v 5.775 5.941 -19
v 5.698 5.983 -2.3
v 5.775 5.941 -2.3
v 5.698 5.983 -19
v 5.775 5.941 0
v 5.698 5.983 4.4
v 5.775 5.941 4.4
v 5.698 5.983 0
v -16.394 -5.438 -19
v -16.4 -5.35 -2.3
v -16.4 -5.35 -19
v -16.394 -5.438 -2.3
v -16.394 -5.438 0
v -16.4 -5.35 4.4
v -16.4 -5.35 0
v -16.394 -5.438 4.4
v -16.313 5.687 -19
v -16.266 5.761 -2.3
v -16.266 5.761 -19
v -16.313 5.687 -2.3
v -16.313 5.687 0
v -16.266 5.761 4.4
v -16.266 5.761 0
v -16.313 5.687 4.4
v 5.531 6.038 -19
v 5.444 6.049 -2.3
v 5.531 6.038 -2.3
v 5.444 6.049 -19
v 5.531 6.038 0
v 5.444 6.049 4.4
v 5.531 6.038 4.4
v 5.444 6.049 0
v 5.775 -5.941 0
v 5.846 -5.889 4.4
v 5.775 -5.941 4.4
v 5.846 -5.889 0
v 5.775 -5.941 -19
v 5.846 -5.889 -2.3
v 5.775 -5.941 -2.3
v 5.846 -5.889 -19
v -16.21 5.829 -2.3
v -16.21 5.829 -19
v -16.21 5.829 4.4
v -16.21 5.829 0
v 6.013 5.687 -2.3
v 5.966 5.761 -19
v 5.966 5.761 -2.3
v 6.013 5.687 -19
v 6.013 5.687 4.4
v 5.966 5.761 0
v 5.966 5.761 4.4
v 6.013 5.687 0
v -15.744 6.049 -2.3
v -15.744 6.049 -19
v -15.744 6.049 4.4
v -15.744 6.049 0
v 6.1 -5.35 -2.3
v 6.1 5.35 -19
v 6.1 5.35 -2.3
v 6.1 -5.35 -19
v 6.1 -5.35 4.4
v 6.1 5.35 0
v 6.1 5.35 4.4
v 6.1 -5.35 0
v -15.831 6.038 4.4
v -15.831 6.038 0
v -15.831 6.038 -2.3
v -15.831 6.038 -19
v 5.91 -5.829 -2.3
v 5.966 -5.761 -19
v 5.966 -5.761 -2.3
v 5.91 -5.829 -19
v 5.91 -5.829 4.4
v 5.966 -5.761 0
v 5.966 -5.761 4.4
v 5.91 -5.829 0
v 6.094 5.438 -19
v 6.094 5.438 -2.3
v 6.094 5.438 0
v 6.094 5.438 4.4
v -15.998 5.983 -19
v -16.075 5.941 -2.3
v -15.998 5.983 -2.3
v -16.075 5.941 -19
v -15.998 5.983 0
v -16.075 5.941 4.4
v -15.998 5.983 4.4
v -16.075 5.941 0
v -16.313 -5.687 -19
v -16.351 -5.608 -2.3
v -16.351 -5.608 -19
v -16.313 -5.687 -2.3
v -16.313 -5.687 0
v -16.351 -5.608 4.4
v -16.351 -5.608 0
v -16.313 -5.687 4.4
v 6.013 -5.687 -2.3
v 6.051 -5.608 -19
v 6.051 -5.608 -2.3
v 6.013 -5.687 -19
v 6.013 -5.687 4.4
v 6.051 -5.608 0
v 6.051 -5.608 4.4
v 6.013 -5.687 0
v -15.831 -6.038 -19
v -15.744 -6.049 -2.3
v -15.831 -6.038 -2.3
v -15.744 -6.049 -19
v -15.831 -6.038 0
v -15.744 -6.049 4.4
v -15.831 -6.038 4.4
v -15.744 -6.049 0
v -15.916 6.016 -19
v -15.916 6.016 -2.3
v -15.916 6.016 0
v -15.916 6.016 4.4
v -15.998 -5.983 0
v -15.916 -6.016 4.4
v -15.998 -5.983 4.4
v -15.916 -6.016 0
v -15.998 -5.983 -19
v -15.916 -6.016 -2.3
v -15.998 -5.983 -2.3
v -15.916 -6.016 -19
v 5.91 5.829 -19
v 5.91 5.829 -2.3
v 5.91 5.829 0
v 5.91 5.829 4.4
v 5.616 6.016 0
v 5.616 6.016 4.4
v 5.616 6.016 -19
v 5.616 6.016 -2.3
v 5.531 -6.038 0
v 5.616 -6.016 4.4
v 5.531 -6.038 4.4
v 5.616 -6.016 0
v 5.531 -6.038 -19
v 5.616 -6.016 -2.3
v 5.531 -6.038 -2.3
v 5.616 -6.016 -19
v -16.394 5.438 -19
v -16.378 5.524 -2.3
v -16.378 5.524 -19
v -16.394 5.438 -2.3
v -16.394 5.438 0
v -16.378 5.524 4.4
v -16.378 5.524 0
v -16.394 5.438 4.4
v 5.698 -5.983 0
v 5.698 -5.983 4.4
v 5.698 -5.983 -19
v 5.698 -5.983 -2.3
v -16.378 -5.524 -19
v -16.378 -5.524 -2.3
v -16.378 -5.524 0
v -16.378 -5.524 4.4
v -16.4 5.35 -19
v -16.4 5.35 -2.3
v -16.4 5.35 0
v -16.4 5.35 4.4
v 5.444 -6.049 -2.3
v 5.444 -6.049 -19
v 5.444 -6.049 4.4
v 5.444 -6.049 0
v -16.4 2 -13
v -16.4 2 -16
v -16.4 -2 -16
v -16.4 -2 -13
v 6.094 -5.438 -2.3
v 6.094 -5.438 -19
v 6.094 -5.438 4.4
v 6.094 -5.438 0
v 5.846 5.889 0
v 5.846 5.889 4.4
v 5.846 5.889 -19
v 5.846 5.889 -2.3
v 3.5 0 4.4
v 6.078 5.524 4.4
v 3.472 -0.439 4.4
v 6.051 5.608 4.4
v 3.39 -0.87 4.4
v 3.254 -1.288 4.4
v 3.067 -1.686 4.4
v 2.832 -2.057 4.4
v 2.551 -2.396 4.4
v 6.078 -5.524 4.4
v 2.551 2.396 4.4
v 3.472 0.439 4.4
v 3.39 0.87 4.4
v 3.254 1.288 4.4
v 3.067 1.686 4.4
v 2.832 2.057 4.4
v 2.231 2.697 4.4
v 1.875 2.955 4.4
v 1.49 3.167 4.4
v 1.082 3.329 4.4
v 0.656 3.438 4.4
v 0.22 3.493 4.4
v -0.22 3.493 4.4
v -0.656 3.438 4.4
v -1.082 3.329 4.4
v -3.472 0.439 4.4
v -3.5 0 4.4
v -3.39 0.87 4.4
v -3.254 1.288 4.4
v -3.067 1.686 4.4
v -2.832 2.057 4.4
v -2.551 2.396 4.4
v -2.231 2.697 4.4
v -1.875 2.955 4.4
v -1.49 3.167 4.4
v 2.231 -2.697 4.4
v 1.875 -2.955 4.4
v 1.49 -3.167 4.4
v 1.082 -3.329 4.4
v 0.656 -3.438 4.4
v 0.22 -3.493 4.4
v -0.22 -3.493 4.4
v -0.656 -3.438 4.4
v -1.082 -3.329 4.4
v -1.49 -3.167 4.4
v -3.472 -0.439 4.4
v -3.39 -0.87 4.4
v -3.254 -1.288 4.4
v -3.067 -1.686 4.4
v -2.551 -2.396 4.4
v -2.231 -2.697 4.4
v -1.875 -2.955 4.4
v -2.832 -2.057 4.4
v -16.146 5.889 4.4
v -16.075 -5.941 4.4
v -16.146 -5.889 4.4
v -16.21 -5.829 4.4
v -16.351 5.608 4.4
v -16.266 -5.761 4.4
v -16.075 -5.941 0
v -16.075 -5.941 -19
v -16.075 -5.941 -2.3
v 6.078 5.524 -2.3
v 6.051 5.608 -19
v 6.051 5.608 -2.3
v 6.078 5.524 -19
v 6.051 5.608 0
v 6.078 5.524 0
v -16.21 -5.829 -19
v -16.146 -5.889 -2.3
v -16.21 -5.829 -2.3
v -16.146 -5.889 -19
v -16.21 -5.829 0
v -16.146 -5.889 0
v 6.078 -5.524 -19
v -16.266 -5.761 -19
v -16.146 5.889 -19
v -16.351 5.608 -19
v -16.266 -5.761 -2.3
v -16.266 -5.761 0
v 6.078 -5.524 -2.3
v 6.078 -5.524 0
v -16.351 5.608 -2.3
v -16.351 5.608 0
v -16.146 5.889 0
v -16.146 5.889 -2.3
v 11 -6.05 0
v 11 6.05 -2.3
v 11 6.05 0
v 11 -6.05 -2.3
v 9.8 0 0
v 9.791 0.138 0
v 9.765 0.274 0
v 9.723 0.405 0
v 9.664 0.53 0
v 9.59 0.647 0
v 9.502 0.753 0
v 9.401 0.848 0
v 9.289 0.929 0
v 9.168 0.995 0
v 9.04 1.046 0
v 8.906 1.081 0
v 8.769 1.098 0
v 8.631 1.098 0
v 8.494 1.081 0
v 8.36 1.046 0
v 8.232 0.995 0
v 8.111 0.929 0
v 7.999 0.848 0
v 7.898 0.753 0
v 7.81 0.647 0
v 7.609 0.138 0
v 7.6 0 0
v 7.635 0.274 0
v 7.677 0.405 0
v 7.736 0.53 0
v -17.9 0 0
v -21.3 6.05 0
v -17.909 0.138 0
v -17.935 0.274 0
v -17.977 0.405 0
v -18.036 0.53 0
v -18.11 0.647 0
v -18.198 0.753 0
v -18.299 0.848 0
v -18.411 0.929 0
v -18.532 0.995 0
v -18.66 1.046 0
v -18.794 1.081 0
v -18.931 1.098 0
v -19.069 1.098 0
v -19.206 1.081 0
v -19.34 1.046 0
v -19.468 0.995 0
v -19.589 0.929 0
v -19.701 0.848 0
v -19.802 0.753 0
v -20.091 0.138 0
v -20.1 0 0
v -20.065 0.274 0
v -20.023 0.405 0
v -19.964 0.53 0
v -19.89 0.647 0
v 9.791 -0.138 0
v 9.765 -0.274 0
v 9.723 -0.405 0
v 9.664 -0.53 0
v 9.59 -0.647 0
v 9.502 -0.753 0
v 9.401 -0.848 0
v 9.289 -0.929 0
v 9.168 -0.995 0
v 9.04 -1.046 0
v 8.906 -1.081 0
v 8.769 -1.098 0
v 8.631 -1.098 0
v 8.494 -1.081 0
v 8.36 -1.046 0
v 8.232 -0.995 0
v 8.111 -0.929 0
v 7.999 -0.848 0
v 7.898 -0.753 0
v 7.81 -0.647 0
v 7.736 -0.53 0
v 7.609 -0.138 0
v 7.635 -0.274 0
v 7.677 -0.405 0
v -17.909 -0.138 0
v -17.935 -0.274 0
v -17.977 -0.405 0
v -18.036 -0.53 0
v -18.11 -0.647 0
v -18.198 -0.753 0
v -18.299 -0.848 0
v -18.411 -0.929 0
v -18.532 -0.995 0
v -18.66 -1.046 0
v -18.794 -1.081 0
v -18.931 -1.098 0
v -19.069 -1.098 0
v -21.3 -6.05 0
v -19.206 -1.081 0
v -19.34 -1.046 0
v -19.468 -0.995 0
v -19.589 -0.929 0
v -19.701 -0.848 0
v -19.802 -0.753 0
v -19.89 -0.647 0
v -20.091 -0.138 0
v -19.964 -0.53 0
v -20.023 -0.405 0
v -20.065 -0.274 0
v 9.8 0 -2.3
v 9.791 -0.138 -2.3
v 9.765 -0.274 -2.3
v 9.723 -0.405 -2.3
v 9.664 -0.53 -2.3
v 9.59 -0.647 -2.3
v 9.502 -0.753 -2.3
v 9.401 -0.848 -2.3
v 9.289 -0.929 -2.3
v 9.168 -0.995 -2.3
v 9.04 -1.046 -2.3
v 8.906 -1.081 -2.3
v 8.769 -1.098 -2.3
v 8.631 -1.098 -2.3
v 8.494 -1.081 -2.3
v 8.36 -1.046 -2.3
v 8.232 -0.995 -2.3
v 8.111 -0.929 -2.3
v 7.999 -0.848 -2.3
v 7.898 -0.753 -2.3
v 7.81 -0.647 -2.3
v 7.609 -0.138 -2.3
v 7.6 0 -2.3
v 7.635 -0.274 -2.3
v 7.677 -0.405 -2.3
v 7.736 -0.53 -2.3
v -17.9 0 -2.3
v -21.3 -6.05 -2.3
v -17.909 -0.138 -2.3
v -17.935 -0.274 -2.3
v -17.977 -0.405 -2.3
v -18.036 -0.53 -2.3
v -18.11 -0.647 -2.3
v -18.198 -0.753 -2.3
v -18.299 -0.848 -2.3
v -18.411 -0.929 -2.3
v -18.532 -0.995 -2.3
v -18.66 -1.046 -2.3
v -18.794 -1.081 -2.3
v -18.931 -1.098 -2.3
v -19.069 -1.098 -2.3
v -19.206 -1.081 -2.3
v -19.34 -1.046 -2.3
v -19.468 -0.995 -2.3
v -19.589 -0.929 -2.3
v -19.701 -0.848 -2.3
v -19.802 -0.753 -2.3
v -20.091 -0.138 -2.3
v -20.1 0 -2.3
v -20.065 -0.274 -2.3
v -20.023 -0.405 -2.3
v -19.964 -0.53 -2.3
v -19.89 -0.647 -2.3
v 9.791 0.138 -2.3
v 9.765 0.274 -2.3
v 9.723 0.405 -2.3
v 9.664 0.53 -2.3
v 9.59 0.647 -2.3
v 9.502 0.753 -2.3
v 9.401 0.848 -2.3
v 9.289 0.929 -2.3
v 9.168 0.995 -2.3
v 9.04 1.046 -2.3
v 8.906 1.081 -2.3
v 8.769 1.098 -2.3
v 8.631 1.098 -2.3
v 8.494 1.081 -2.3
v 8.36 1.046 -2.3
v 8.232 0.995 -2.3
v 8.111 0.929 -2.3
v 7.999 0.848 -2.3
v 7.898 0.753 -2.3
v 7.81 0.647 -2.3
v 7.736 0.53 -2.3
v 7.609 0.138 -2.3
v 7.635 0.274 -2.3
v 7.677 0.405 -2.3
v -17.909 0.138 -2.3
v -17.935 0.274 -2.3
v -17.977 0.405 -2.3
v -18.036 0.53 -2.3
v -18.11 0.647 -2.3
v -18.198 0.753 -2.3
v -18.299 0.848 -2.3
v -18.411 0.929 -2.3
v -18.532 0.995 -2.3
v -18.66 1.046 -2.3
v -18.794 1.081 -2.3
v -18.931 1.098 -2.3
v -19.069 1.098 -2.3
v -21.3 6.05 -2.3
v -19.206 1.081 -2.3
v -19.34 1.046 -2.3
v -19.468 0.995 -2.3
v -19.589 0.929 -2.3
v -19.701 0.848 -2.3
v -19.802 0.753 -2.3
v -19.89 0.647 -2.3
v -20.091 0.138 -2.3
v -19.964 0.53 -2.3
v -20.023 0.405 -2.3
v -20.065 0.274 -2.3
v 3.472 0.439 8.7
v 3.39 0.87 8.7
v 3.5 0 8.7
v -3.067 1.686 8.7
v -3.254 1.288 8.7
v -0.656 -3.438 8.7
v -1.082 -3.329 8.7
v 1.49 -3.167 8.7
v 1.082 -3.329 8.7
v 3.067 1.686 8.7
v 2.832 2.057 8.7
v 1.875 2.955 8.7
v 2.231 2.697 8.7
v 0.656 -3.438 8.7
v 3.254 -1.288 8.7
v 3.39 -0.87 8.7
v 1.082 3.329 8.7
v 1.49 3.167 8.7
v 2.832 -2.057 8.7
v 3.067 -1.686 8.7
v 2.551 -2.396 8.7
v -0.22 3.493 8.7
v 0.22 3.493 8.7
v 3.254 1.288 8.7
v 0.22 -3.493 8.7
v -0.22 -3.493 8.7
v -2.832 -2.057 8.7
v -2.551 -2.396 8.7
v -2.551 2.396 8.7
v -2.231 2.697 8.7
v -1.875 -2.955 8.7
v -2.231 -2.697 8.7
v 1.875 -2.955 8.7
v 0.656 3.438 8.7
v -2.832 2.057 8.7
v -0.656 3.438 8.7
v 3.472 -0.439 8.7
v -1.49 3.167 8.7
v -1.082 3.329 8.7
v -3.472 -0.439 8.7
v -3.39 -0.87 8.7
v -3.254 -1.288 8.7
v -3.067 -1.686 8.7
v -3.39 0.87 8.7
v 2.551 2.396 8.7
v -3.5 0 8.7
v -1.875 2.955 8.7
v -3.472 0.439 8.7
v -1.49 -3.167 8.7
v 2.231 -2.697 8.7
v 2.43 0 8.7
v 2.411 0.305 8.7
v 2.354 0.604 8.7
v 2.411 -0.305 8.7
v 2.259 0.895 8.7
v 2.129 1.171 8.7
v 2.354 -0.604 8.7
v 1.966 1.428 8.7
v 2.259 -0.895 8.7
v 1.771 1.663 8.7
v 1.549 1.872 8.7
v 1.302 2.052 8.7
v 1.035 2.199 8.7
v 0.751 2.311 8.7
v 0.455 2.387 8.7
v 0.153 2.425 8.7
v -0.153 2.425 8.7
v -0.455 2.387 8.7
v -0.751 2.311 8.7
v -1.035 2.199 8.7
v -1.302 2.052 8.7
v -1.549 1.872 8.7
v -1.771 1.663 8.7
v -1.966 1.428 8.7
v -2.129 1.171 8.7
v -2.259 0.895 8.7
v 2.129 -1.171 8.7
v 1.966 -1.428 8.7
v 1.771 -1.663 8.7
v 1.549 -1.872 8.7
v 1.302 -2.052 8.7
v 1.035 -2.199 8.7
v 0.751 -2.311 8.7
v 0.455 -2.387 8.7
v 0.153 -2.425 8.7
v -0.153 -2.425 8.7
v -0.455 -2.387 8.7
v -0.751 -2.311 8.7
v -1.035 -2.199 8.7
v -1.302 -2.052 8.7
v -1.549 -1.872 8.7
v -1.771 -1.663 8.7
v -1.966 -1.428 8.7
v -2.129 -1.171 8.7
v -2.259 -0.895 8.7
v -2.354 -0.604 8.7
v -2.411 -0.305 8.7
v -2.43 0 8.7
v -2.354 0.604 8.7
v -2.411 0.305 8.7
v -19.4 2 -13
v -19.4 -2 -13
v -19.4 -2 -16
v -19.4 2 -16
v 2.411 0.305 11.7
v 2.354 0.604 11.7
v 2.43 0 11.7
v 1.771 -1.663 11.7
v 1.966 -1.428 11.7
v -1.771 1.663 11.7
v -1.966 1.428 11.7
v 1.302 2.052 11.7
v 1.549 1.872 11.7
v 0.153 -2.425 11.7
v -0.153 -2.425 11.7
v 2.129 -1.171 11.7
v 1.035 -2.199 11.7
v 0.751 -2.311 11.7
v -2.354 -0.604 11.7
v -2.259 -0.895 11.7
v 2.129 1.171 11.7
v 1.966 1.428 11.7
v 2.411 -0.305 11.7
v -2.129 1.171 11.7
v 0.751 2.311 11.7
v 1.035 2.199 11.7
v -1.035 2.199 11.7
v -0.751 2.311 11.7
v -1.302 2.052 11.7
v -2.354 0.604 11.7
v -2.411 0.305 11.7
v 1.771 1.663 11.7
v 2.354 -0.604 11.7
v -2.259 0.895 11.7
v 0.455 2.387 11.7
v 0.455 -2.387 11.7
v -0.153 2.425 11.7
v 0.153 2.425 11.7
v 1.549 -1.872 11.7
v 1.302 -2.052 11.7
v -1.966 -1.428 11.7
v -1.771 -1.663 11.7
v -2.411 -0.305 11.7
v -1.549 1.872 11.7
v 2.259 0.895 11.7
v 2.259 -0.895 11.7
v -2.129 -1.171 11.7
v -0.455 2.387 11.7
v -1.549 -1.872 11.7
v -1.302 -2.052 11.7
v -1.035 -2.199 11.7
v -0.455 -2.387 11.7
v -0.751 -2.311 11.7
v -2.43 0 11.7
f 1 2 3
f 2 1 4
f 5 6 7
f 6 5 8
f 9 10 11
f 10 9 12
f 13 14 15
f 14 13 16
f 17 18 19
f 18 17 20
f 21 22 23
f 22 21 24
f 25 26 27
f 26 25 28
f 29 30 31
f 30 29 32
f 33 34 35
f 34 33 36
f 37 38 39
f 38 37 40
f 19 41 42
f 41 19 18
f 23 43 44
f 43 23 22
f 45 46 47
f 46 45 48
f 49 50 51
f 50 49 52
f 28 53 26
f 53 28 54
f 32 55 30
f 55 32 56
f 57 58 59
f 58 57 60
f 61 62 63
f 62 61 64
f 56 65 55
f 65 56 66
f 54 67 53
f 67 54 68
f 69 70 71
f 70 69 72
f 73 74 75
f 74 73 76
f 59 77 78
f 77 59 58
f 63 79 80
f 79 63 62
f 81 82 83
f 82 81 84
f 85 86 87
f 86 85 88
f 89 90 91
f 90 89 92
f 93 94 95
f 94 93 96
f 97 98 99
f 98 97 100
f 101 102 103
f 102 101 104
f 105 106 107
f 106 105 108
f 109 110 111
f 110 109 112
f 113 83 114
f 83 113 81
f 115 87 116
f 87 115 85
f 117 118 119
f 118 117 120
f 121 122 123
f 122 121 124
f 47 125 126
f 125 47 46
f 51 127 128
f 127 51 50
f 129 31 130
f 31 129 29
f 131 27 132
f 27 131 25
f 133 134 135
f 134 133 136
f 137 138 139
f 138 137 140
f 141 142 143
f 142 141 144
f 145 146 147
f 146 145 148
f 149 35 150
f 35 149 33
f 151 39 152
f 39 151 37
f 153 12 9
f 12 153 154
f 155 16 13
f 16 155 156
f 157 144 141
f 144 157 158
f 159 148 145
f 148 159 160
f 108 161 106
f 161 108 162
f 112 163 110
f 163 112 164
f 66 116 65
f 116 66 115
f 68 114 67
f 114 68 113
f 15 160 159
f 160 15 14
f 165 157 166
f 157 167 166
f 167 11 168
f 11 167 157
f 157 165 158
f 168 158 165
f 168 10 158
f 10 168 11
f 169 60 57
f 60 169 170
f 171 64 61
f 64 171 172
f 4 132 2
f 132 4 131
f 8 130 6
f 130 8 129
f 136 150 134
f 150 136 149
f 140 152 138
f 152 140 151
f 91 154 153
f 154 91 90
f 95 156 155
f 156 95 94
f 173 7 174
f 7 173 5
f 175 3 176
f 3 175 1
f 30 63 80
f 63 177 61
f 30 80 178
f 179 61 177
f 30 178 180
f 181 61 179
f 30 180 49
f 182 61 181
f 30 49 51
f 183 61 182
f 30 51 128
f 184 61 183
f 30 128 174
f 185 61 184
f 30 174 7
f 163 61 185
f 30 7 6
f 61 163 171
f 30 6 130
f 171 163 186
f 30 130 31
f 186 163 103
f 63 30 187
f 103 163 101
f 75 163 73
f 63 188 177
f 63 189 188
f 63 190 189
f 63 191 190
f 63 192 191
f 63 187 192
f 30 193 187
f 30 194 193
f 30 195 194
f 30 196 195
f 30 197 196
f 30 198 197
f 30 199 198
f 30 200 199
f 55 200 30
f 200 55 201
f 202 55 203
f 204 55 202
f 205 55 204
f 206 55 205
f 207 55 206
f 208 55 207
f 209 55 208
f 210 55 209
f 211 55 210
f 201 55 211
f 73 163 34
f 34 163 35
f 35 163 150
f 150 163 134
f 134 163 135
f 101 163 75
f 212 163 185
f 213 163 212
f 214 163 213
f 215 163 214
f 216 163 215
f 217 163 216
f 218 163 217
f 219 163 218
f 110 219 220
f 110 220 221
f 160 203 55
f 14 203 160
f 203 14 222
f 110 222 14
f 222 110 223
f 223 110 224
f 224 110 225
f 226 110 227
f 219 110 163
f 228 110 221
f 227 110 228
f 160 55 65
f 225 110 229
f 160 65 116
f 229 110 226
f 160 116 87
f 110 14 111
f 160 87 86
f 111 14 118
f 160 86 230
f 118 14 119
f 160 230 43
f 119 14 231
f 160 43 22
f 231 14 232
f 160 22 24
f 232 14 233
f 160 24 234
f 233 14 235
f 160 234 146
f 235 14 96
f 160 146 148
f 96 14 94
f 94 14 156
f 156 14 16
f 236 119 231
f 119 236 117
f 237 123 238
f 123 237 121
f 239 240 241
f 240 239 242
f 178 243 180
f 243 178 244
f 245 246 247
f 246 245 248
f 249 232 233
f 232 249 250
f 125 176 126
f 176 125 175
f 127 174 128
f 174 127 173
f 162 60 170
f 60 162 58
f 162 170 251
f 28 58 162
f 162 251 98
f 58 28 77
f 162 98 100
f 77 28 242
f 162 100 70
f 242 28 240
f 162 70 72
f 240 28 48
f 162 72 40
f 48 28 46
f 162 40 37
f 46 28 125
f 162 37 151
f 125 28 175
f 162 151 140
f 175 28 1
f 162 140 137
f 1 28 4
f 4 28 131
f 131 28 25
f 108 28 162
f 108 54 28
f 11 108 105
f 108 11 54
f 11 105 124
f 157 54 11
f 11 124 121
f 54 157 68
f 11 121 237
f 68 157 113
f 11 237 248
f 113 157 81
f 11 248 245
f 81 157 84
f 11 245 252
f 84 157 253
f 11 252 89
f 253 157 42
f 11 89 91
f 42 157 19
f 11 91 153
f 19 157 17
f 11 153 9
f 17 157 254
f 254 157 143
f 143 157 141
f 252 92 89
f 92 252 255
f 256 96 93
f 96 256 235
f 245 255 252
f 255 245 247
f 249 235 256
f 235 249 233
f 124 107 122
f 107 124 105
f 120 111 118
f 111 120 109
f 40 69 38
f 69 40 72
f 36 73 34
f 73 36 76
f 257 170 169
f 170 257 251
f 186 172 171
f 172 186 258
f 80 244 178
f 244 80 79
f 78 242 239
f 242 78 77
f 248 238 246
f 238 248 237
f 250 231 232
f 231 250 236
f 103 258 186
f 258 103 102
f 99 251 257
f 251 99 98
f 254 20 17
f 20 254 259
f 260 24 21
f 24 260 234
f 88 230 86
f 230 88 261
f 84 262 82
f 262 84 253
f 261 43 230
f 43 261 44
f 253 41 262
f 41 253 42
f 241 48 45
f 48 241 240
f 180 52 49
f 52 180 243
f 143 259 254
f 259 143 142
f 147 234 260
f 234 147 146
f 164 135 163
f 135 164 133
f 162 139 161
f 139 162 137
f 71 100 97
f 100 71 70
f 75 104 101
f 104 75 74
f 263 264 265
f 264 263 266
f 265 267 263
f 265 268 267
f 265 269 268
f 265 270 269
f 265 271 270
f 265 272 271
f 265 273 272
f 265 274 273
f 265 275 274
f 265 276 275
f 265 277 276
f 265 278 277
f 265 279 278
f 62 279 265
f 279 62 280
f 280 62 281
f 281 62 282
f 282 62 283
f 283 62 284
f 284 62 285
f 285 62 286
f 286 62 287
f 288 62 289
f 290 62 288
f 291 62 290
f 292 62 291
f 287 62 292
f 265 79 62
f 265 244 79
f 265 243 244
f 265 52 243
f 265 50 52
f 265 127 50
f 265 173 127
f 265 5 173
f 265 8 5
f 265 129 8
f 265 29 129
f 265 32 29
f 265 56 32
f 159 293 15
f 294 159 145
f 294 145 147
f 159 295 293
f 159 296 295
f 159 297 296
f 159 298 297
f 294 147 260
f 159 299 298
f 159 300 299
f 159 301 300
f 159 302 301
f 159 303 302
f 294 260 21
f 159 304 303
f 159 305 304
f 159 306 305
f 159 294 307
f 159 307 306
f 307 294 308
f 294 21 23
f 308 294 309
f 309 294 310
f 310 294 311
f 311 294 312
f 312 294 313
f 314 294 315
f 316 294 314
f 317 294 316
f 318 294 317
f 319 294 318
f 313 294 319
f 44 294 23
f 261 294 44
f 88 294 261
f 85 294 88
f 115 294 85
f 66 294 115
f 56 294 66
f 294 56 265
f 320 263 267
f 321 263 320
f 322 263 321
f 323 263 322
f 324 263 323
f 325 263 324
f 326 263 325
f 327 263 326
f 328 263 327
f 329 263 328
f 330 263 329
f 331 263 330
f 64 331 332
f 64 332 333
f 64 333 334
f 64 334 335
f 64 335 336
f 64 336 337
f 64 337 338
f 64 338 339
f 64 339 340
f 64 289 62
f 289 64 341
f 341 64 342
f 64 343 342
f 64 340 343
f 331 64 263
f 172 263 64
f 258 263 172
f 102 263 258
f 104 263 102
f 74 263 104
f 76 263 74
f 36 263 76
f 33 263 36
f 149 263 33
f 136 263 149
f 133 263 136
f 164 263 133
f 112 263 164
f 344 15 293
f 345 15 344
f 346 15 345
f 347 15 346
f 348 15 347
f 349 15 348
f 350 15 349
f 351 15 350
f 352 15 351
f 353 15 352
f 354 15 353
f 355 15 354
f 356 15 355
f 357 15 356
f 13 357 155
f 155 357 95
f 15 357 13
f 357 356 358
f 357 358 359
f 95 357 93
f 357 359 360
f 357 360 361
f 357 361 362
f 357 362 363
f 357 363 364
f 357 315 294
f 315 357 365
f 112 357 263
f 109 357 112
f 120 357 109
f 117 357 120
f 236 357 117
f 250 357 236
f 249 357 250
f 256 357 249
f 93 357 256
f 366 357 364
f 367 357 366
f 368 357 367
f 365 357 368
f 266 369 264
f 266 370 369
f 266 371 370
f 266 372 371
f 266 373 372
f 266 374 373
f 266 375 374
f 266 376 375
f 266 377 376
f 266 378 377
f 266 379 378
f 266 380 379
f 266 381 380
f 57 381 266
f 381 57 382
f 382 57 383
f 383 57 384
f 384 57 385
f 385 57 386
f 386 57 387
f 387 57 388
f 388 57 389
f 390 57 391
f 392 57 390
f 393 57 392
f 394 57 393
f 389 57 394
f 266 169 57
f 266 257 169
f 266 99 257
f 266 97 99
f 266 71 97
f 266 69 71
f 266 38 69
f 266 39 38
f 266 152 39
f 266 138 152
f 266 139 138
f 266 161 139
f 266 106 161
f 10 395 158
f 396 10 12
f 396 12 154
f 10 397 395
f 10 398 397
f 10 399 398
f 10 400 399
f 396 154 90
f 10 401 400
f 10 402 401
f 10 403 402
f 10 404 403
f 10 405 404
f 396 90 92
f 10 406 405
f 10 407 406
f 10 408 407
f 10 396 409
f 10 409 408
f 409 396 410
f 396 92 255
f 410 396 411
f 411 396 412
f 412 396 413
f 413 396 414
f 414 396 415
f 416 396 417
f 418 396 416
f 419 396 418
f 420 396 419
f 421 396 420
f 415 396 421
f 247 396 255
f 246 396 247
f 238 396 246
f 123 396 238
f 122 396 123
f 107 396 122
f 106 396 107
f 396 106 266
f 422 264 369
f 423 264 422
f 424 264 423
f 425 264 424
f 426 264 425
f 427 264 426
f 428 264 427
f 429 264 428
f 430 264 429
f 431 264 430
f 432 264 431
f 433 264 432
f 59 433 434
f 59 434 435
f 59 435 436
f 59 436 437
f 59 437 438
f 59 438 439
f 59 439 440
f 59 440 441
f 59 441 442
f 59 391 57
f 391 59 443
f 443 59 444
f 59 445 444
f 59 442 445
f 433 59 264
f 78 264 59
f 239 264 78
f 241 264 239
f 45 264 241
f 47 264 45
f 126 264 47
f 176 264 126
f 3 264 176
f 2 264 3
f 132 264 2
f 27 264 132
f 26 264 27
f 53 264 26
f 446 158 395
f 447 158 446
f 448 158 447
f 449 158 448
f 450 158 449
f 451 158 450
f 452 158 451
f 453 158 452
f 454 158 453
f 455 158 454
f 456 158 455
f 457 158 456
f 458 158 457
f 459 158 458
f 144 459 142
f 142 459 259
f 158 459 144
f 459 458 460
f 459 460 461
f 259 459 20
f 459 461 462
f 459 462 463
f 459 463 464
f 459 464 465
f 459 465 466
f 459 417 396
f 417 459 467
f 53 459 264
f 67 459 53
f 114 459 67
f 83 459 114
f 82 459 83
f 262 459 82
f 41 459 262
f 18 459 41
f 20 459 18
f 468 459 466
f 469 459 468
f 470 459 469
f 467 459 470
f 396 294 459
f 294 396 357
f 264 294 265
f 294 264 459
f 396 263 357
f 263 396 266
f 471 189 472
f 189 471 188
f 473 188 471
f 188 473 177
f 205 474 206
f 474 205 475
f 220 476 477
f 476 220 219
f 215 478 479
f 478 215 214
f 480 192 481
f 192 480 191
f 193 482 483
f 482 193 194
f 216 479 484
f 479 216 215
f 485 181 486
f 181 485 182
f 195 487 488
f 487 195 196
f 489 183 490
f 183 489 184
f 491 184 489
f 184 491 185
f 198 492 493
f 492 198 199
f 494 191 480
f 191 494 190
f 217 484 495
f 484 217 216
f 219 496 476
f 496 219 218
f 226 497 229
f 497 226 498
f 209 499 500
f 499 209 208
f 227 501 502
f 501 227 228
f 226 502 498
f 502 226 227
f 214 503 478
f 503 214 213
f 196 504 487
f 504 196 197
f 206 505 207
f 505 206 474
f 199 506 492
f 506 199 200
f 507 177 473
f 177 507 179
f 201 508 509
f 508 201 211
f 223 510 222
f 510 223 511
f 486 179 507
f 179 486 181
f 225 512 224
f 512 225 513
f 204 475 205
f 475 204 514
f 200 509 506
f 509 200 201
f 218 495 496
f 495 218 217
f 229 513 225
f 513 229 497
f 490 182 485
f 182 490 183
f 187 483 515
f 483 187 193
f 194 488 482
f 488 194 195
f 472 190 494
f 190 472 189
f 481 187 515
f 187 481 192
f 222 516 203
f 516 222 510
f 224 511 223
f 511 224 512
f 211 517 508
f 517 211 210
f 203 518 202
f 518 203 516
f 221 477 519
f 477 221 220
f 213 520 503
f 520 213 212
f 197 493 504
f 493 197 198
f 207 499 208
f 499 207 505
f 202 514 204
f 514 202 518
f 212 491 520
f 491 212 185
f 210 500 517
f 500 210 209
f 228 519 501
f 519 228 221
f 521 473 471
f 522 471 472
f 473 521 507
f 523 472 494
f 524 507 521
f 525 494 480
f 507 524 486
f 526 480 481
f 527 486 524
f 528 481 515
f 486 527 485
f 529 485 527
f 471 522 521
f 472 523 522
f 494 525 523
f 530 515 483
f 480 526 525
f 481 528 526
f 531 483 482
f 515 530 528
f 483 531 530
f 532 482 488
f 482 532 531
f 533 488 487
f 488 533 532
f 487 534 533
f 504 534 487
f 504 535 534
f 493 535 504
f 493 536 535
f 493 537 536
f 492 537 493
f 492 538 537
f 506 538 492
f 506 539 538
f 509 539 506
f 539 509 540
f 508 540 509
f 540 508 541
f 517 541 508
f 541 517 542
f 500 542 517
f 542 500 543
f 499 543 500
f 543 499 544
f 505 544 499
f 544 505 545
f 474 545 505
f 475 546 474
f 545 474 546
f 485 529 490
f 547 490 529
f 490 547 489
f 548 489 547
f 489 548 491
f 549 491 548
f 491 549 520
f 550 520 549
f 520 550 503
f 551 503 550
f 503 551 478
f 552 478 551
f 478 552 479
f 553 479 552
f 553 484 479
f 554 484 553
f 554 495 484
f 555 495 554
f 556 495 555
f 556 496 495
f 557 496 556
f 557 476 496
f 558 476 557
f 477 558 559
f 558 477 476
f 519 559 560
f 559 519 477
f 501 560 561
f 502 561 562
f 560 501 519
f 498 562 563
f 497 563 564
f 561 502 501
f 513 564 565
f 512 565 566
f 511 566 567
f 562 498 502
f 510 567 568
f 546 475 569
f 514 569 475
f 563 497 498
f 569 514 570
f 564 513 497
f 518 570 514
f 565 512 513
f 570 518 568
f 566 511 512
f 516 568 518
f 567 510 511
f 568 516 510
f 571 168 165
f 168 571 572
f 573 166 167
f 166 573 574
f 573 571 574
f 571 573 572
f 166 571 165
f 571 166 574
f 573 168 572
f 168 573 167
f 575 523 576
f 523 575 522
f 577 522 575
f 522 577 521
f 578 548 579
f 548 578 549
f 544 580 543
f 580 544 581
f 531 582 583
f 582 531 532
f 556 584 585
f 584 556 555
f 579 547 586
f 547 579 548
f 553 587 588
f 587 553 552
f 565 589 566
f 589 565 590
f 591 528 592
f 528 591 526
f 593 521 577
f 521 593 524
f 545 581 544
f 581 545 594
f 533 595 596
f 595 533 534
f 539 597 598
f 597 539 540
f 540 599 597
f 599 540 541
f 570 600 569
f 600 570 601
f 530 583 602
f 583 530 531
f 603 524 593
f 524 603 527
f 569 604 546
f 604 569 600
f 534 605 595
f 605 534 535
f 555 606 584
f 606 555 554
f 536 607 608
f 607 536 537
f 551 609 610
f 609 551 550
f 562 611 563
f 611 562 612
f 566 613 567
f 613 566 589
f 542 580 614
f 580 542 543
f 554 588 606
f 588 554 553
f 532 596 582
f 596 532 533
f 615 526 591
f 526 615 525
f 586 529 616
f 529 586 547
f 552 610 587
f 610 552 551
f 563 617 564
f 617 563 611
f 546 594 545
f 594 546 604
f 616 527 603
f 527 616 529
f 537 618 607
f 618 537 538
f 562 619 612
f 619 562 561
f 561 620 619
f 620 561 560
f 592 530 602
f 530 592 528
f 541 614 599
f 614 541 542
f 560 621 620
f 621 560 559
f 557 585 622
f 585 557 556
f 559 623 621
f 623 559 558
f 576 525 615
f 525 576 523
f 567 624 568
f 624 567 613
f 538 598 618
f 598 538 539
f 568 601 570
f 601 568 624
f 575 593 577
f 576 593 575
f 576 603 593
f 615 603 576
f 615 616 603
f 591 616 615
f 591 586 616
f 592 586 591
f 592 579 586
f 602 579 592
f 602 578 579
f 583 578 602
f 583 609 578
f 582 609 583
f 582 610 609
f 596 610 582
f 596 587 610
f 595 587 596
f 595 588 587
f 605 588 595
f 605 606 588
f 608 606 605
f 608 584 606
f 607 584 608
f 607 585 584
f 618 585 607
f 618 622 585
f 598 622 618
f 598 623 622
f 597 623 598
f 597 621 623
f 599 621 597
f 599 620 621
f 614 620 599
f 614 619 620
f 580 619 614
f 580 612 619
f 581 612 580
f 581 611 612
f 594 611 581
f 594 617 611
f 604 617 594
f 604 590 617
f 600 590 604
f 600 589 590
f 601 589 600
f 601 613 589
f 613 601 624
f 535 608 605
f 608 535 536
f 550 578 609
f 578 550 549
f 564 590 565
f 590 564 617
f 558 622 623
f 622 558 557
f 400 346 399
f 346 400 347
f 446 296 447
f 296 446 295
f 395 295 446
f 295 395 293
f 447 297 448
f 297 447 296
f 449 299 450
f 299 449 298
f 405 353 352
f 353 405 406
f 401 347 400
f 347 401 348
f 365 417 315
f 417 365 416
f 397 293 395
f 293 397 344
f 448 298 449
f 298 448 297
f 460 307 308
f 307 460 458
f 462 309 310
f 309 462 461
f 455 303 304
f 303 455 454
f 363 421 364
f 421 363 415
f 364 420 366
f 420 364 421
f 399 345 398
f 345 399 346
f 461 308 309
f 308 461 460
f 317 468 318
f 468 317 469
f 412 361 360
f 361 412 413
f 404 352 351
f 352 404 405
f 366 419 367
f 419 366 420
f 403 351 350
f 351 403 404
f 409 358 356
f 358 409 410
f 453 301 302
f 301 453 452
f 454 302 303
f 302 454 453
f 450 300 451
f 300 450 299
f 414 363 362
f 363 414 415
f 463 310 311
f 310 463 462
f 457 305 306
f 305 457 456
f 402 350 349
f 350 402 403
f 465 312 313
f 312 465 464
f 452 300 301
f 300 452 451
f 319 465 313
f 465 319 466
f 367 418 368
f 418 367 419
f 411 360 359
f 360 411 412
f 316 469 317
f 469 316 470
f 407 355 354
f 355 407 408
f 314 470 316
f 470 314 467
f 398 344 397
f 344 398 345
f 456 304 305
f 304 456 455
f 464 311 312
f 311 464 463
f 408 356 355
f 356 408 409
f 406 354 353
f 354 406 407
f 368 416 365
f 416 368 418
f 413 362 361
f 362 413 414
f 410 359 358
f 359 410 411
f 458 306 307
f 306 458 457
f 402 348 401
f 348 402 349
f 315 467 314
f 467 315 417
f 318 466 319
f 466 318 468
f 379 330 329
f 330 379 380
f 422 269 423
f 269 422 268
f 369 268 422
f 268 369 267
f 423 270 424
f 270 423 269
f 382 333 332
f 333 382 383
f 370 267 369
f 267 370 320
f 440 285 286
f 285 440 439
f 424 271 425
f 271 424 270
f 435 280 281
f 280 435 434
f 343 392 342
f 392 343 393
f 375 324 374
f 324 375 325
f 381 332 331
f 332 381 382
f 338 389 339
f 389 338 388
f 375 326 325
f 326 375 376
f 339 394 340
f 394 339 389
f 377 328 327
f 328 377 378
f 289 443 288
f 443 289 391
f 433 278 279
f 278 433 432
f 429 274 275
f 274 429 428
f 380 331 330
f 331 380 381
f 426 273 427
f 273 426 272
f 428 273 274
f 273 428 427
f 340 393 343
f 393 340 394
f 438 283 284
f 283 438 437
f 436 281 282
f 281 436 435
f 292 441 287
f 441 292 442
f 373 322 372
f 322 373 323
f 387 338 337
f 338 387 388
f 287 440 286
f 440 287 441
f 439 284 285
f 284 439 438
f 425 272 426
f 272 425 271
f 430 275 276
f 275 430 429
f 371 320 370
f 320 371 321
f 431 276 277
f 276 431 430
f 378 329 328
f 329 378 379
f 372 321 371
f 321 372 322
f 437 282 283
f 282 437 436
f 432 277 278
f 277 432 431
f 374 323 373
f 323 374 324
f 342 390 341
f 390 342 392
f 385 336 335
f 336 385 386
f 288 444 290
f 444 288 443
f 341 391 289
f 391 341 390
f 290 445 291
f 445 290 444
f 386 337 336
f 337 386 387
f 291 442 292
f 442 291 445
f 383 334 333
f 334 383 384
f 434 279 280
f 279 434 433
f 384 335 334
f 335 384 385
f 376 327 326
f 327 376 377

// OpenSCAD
$fn = 50;

difference() {
	union() {
		translate(v = [-5.15, 0, -19.0]) {
			hull() {
				translate(v = [-10.55, 5.35, 0]) {
					cylinder(h = 23.4, r = 0.7);
				}
				translate(v = [10.55, 5.35, 0]) {
					cylinder(h = 23.4, r = 0.7);
				}
				translate(v = [-10.55, -5.35, 0]) {
					cylinder(h = 23.4, r = 0.7);
				}
				translate(v = [10.55, -5.35, 0]) {
					cylinder(h = 23.4, r = 0.7);
				}
			}
		}
		translate(v = [-21.299999999999997, -6.05, -2.3]) {
			cube(size = [32.3, 12.1, 2.3]);
		}
		translate(v = [0, 0, 4.4]) {
			cylinder(h = 4.299999999999999, r = 3.5);
		}
		translate(v = [-19.4, -2.0, -16.0]) {
			cube(size = [4, 4, 3]);
		}
		translate(v = [0, 0, 8.7]) {
			cylinder(h = 3.0, r = 2.43);
		}
	}
	union() {
		translate(v = [-19.0, 0, -4]) {
			cylinder(h = 5, r = 1.1);
		}
		translate(v = [8.7, 0, -4]) {
			cylinder(h = 5, r = 1.1);
		}
	}
}
